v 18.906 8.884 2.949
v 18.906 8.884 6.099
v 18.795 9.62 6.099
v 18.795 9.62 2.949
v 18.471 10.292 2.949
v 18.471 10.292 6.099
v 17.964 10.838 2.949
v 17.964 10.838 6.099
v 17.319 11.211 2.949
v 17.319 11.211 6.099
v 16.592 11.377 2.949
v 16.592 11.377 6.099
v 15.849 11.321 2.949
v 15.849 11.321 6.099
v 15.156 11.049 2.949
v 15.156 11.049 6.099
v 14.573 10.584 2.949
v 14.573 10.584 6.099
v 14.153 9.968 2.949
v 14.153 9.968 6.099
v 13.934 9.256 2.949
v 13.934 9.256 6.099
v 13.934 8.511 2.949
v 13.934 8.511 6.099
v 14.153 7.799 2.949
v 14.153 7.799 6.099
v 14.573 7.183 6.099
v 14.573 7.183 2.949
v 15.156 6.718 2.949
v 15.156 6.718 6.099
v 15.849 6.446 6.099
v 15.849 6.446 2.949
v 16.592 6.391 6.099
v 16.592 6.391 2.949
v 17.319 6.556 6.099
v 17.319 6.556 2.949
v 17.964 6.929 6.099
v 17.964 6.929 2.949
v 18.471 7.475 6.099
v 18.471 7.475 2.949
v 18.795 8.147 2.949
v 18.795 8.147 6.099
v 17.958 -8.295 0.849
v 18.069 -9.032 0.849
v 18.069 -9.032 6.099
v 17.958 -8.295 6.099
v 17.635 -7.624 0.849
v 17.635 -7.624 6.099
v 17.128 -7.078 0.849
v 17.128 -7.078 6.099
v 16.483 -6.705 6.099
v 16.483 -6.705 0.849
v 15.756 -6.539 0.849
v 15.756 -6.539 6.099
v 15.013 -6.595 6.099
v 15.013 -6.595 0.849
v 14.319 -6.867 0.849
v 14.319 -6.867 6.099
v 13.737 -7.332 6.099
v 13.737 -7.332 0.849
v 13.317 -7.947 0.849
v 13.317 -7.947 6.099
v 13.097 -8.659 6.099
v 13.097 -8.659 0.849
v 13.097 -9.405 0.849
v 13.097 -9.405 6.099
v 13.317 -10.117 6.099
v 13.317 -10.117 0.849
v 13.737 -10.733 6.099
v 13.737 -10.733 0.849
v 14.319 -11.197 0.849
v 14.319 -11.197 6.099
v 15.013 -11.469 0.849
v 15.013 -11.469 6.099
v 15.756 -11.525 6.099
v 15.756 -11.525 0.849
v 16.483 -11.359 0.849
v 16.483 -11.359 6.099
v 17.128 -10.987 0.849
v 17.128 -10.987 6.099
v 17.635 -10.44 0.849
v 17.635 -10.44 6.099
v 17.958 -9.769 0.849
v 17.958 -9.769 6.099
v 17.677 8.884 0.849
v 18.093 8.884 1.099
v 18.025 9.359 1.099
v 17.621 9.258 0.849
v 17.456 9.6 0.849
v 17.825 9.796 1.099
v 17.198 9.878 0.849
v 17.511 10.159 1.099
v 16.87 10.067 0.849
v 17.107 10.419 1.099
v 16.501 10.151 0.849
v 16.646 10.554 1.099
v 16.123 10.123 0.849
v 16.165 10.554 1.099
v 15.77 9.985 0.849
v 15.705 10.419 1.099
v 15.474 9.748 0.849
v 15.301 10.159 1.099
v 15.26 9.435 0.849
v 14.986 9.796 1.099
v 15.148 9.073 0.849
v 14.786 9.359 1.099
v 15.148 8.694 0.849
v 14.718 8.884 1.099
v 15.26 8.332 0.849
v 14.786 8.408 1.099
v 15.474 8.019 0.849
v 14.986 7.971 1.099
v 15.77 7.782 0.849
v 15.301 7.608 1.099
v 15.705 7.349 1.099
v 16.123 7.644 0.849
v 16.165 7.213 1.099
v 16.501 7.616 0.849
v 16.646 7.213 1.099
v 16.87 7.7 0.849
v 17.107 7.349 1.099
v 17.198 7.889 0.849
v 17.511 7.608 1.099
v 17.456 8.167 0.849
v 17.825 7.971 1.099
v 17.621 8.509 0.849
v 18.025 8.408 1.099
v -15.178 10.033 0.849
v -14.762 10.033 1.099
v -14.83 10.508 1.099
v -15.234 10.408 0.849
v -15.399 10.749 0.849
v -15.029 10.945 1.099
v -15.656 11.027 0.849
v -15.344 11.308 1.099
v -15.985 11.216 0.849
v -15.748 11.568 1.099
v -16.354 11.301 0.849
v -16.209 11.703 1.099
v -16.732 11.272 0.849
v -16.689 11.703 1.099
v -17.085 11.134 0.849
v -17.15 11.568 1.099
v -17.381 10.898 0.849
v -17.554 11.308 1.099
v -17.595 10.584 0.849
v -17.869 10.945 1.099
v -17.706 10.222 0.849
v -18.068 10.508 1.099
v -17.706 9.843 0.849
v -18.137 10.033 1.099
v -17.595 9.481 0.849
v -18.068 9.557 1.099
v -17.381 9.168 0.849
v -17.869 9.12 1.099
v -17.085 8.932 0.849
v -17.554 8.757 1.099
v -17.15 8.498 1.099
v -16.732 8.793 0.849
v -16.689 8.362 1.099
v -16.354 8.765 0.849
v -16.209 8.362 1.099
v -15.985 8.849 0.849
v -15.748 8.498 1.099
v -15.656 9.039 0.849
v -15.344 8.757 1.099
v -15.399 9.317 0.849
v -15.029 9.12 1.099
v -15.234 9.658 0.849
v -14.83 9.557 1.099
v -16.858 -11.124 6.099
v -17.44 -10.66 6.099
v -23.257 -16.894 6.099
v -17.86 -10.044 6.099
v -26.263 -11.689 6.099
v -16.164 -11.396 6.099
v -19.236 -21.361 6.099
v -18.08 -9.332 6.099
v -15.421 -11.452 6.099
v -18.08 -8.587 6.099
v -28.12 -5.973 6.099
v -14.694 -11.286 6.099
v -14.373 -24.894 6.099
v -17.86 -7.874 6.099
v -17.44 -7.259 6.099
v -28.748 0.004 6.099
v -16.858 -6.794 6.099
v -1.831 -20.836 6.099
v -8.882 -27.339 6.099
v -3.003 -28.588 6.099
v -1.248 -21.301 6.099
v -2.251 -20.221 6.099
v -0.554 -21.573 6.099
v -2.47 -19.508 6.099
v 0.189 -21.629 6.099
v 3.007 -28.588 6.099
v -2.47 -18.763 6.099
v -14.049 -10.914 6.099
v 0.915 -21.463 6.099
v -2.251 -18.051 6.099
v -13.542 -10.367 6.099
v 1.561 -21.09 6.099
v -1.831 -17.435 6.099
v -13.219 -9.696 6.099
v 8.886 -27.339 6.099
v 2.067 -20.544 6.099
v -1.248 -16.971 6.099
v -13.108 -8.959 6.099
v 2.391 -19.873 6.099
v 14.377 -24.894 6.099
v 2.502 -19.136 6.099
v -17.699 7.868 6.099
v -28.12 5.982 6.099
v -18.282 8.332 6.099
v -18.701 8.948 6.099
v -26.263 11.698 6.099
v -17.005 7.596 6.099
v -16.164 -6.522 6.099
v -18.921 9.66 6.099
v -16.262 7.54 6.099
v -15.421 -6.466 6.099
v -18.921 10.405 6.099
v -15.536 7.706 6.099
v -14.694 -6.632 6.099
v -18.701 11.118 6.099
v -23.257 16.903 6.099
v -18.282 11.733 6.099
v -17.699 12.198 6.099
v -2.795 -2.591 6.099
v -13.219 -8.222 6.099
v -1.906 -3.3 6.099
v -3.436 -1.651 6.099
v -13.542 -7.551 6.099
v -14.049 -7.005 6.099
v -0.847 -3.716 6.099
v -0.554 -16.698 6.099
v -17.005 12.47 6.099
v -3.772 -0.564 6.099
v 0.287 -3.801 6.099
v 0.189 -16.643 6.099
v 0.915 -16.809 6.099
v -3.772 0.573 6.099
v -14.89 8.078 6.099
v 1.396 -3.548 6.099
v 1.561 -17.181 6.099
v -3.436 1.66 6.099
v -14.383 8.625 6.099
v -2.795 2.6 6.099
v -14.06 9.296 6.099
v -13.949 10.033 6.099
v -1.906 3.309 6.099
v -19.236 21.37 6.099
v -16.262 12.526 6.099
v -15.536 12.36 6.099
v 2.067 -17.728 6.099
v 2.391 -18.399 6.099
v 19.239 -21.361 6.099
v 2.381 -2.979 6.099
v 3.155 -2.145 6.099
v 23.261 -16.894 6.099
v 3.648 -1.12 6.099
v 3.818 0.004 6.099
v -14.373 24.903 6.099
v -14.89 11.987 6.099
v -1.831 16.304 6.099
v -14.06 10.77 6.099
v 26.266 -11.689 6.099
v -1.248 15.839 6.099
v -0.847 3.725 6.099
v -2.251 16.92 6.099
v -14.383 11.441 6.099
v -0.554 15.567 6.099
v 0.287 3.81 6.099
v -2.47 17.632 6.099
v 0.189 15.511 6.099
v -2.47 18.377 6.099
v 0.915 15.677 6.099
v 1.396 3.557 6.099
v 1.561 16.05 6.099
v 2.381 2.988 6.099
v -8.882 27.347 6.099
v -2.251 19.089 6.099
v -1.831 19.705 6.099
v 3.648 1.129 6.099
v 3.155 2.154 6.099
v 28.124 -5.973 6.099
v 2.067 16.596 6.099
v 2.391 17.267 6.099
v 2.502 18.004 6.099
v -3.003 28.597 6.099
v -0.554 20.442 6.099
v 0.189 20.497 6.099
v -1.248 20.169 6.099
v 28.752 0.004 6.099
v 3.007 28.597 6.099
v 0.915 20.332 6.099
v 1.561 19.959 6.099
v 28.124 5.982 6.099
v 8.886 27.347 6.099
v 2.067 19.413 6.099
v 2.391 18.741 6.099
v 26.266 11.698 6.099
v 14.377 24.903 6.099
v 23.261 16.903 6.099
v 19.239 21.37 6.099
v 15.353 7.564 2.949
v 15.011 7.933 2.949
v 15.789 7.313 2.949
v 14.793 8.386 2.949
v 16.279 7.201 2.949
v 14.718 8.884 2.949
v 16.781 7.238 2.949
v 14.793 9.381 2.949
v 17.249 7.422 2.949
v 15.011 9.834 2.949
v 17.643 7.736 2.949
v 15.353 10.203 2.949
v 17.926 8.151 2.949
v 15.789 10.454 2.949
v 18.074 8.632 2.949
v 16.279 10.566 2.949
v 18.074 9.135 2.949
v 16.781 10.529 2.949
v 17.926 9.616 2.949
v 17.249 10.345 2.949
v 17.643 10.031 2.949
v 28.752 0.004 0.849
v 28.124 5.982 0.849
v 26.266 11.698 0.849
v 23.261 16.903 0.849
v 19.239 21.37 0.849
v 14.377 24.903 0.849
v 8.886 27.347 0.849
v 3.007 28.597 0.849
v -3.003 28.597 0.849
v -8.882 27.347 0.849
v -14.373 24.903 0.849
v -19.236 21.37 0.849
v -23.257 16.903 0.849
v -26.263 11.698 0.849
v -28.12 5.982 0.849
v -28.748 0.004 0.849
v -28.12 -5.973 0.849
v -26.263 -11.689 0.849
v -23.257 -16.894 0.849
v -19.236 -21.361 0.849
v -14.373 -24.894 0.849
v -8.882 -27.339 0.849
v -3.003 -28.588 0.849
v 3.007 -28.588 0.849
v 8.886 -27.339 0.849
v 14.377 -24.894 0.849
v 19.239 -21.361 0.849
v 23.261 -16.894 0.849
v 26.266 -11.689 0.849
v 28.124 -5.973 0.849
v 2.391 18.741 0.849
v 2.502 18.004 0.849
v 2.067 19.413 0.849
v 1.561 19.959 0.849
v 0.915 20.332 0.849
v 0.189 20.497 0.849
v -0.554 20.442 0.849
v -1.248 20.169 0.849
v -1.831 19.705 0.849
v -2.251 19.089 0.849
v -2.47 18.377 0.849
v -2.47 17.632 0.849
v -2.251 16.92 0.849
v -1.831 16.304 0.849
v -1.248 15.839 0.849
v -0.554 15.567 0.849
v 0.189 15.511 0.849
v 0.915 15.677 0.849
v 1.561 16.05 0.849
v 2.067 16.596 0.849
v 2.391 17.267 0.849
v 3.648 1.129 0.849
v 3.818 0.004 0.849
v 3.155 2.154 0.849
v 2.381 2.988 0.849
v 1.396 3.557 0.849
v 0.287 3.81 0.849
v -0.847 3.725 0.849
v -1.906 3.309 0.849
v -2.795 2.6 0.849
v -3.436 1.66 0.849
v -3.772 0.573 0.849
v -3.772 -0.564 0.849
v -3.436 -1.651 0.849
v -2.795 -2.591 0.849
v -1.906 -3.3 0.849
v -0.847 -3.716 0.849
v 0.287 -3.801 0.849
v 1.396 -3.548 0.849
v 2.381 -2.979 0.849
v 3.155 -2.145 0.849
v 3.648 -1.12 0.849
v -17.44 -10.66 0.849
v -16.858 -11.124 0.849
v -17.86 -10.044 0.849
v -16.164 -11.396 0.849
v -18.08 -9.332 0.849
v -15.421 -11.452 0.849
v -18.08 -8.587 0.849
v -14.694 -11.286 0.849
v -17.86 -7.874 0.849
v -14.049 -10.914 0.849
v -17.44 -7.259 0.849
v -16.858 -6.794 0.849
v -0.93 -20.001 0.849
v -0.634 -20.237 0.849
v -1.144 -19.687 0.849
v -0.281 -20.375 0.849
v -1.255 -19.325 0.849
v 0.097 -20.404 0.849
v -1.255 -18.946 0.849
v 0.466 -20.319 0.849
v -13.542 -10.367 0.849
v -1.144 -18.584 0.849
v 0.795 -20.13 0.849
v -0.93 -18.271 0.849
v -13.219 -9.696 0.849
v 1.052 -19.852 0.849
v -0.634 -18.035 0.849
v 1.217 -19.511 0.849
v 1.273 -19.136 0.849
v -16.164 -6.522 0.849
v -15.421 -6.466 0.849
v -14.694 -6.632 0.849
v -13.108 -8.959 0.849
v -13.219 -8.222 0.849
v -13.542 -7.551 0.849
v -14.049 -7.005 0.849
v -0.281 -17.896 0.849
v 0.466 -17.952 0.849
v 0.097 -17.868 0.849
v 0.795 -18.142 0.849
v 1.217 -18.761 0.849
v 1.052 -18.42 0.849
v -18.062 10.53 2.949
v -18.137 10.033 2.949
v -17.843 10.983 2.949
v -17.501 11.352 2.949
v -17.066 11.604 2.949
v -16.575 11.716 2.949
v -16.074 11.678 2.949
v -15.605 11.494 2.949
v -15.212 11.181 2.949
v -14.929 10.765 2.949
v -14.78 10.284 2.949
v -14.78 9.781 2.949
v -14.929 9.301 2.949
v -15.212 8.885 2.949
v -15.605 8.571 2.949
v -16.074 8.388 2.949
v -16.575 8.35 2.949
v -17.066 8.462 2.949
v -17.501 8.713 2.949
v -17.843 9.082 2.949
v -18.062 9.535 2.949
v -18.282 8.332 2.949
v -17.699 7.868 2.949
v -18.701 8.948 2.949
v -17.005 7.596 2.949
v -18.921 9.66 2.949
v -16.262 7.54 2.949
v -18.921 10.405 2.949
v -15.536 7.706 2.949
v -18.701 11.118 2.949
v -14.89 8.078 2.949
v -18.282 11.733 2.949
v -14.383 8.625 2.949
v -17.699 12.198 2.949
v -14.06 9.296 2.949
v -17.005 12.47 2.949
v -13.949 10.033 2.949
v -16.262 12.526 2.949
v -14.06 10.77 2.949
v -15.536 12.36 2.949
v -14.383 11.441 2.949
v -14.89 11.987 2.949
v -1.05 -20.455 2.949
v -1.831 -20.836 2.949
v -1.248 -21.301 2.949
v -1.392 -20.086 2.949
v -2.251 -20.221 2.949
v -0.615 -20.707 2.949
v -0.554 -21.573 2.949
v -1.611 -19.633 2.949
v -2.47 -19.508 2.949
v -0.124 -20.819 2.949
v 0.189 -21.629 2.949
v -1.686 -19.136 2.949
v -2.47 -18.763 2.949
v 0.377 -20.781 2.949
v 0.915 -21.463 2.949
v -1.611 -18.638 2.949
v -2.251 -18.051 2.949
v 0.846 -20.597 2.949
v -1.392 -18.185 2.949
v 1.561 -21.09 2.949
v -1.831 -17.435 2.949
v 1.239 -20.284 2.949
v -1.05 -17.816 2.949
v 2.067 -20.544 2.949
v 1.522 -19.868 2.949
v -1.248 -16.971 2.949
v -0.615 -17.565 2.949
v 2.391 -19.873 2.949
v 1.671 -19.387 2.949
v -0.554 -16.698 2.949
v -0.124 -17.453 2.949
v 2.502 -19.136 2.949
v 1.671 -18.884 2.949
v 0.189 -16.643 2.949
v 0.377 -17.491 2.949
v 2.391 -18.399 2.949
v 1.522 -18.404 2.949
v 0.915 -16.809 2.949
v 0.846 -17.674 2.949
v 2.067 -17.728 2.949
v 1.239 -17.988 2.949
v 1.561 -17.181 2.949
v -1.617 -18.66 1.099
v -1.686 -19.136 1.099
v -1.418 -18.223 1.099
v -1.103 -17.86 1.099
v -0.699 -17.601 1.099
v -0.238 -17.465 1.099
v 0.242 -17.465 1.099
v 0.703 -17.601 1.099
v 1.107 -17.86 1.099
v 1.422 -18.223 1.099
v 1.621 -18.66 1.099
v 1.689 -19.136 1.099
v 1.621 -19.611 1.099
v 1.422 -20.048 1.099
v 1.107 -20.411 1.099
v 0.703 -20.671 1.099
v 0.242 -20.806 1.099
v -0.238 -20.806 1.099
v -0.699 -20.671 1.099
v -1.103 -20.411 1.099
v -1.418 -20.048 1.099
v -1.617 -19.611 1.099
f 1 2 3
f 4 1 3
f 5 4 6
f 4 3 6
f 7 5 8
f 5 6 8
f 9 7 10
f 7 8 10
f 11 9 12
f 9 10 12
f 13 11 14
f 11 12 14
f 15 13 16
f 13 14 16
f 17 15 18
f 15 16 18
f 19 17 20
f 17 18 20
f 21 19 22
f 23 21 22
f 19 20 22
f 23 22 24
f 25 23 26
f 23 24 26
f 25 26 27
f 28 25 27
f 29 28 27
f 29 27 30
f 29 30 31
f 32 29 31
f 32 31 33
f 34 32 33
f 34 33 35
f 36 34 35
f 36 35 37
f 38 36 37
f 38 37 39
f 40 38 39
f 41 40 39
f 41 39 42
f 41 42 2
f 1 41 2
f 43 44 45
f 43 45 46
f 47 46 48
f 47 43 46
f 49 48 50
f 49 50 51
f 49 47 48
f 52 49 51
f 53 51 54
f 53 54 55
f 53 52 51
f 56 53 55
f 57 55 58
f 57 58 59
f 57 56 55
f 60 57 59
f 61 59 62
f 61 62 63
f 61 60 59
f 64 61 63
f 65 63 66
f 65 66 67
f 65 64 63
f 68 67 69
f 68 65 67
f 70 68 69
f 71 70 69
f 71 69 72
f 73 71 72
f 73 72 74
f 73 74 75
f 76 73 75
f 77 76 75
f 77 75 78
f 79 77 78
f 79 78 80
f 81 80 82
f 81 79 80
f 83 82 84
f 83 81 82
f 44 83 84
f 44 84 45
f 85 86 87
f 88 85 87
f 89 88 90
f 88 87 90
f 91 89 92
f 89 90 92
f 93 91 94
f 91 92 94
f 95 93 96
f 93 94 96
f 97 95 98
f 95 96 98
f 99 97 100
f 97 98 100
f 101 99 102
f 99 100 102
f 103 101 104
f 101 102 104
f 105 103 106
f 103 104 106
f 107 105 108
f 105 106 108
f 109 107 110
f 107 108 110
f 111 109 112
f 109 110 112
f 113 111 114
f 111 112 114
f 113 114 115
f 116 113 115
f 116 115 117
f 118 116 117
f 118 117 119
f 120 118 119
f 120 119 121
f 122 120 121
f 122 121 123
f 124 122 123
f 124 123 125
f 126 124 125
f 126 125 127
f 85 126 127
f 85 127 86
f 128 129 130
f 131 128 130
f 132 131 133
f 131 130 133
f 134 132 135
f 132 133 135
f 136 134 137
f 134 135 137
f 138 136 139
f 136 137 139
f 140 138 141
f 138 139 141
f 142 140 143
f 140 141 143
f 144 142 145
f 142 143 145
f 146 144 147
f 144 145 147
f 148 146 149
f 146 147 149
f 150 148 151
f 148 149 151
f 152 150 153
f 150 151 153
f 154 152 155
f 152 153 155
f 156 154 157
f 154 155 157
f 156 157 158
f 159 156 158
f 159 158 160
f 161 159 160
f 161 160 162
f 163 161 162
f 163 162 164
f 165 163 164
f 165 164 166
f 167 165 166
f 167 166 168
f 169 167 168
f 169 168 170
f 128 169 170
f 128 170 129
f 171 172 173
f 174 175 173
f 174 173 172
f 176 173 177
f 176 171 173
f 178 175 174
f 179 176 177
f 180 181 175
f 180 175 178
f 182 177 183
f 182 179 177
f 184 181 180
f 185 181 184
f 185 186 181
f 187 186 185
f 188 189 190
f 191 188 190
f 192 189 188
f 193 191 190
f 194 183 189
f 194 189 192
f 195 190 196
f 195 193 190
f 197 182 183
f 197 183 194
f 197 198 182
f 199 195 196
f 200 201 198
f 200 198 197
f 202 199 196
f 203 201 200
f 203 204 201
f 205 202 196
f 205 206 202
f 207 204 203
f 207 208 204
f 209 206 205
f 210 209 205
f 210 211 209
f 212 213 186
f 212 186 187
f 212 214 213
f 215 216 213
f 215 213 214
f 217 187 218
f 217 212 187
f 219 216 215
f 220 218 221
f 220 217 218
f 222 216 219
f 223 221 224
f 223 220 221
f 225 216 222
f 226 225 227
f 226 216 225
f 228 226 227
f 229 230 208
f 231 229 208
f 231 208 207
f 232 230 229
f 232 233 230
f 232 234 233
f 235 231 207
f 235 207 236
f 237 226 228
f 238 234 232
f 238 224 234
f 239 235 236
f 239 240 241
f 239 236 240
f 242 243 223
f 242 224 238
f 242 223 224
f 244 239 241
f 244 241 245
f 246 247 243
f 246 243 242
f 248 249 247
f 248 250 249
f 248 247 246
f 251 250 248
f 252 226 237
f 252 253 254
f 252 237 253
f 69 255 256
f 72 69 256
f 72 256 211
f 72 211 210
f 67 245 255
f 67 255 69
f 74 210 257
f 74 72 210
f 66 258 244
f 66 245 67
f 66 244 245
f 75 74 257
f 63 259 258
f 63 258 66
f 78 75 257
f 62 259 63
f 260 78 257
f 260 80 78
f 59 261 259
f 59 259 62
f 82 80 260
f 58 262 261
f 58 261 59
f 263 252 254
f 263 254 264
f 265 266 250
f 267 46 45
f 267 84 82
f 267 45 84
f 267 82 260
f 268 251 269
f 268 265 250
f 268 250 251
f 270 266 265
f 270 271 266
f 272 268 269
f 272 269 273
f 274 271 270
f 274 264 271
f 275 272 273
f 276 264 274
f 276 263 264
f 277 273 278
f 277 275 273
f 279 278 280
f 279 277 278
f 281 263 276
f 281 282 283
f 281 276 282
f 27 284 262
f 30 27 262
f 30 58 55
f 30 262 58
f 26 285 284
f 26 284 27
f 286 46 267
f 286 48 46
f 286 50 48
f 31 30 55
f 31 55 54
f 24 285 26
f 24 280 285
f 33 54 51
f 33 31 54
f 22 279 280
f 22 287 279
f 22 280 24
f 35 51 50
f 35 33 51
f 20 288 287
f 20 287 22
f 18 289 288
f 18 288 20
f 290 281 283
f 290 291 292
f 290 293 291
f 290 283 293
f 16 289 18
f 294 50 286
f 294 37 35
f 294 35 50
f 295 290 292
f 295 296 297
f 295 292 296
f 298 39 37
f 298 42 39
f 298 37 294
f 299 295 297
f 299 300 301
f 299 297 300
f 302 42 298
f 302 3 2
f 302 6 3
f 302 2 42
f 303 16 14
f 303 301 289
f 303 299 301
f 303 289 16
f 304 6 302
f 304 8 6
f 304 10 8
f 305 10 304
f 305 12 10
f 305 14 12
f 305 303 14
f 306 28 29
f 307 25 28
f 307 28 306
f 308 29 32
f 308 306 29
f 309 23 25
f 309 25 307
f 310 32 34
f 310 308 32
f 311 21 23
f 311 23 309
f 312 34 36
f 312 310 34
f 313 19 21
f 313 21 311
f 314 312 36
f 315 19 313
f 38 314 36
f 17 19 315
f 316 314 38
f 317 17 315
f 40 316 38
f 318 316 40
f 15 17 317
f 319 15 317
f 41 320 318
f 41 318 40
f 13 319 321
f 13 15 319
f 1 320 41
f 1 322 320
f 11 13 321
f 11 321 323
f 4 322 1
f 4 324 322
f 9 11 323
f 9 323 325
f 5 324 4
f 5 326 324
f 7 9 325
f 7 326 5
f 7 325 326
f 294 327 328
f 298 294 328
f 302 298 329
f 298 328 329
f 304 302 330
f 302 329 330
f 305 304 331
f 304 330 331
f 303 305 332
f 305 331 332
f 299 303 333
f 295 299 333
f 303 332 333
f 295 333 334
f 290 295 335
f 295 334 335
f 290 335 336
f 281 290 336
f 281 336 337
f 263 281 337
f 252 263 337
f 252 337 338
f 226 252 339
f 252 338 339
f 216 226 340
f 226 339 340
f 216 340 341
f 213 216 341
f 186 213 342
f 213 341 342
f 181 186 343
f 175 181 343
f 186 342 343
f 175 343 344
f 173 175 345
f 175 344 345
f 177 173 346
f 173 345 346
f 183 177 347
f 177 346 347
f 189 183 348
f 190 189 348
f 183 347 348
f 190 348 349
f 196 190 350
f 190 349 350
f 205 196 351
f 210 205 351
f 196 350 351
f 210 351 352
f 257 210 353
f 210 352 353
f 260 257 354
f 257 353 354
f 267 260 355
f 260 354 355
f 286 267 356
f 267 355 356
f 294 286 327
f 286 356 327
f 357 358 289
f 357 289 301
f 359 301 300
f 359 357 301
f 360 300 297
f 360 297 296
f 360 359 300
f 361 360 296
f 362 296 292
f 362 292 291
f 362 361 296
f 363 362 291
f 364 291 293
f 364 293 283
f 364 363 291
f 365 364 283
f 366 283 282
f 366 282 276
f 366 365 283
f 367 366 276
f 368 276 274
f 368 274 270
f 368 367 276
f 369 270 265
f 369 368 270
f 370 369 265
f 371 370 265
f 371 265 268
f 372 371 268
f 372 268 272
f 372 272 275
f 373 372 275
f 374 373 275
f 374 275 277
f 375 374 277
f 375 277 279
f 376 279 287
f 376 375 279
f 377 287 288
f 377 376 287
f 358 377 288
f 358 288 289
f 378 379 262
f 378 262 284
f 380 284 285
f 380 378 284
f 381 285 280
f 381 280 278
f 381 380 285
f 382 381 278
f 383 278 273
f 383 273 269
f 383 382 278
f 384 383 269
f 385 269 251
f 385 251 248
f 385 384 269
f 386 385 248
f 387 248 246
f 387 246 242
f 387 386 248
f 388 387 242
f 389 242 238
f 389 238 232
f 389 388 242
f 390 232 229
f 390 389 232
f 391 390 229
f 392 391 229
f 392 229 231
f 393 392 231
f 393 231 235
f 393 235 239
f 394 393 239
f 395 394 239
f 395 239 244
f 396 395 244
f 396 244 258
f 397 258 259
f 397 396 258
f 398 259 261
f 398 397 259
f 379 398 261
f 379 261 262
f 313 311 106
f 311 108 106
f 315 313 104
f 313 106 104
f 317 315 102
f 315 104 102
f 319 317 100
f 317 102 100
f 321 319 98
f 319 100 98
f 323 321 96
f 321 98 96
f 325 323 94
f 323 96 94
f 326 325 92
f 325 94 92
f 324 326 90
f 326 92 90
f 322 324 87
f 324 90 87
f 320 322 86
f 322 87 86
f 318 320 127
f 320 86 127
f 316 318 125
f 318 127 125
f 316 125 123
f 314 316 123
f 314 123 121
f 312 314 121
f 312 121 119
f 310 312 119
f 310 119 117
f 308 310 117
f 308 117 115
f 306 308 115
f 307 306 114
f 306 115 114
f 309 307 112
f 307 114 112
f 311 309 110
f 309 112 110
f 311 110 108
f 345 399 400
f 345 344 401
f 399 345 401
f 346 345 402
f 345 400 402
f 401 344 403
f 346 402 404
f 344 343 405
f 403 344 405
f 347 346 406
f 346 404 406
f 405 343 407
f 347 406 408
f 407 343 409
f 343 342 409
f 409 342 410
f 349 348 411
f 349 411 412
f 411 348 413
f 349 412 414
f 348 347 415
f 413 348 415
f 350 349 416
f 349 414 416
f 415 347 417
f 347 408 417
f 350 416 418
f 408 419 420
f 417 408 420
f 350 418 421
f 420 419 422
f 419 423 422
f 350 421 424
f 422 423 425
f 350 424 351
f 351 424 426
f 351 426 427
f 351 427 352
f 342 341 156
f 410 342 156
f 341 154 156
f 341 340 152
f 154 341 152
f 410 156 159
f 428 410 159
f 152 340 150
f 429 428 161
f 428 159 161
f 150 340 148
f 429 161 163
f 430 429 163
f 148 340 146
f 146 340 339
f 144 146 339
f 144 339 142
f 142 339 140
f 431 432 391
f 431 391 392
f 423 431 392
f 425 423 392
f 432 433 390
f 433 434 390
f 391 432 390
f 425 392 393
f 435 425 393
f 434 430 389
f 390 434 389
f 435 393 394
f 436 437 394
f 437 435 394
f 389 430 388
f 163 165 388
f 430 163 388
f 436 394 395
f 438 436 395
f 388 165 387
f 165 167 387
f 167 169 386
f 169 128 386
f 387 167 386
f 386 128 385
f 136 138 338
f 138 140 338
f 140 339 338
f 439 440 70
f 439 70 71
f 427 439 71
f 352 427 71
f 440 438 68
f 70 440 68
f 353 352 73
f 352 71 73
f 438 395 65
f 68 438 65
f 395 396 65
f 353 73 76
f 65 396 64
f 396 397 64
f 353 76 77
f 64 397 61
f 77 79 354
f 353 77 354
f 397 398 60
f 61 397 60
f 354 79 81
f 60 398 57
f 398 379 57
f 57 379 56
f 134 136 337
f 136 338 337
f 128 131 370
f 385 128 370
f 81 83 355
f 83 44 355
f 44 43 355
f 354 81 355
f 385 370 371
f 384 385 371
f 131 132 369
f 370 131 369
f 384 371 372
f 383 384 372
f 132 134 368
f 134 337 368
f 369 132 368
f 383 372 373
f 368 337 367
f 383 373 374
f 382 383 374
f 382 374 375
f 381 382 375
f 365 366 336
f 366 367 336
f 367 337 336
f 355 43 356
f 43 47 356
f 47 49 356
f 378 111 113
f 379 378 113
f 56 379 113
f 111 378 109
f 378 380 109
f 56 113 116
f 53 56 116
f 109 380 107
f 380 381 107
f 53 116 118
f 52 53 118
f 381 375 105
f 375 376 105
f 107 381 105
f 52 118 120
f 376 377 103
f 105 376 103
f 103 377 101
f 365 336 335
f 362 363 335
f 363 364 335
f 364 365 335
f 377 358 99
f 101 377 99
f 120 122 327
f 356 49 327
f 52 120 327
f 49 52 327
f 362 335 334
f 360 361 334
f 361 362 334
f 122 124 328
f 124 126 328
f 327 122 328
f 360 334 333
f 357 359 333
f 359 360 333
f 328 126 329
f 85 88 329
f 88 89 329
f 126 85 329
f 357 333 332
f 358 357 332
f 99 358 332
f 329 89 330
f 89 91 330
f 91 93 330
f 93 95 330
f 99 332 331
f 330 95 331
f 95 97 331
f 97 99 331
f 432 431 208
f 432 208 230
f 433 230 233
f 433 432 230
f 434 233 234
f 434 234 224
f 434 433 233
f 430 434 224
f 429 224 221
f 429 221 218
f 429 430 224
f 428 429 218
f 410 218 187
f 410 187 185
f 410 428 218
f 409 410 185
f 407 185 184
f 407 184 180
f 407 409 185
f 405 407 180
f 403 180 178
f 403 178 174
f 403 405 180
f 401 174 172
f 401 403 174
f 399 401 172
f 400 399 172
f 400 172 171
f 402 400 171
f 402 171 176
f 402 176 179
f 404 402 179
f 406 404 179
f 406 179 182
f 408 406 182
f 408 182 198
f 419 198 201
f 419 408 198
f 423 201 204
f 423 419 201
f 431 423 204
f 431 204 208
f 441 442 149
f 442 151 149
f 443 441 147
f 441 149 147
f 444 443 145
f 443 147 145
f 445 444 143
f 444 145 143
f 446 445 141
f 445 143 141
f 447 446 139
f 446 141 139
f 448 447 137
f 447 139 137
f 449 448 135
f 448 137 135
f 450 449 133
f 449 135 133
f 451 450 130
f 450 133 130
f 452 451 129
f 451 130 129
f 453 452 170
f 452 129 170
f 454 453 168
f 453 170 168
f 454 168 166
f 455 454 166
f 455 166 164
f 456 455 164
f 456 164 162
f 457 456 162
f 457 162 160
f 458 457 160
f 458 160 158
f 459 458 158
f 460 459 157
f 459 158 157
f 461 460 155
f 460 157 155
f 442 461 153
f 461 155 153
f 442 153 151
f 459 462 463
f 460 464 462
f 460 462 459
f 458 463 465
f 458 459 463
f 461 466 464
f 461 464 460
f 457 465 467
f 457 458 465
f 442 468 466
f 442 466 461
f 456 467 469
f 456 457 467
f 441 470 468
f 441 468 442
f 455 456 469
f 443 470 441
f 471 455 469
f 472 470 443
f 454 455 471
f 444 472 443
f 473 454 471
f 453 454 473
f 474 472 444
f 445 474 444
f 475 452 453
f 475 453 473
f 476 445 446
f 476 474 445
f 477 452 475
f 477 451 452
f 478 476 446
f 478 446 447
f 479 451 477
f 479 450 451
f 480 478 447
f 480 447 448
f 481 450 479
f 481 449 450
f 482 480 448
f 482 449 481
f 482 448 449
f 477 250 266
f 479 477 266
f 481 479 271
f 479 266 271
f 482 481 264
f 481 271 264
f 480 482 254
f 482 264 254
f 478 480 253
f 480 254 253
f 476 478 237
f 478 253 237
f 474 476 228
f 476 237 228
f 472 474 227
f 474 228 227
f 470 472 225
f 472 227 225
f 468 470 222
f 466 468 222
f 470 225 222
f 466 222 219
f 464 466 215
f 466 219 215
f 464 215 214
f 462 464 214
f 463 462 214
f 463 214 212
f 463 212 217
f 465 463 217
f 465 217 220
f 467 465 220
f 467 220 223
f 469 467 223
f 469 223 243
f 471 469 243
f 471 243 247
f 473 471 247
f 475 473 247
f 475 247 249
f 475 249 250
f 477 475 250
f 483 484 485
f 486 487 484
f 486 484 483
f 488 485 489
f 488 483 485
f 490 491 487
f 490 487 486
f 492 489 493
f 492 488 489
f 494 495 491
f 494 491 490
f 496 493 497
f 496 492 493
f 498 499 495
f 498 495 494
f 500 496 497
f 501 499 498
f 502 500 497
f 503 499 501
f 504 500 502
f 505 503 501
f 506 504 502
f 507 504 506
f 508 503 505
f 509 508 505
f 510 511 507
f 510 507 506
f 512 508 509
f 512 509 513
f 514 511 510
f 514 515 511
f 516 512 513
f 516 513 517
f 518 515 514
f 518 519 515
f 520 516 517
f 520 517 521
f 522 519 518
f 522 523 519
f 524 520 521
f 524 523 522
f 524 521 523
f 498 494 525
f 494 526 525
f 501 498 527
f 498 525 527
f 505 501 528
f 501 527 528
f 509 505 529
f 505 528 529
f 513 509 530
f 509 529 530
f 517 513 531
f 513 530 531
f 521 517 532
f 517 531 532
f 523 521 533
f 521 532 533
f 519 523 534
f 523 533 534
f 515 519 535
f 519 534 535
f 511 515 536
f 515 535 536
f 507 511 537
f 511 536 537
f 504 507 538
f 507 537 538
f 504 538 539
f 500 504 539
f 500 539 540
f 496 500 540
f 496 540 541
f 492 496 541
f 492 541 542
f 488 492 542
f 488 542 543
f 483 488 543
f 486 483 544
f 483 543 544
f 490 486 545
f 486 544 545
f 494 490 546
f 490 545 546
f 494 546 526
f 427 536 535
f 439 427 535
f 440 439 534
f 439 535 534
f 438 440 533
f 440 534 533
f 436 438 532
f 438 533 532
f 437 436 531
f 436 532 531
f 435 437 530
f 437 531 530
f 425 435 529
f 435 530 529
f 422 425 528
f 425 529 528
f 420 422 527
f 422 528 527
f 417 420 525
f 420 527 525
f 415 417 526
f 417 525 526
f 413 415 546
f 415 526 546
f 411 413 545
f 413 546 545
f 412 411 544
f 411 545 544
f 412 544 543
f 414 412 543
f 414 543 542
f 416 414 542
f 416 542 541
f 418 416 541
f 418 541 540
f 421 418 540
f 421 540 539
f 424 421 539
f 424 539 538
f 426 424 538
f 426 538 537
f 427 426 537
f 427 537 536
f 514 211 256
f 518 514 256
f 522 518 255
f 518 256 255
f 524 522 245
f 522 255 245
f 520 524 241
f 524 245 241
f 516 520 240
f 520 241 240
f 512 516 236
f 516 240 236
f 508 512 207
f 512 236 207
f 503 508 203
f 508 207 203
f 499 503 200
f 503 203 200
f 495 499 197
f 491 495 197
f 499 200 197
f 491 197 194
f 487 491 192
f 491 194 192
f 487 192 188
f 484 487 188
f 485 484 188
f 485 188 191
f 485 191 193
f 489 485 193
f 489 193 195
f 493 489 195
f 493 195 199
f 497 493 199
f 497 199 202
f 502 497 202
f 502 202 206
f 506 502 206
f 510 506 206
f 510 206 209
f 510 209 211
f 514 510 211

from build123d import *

# Parameters (mm, degrees)
BOSS_EXTRU_1_DEPTH                                 = 14
BOSS_EXTRU_1_DEPTH_BACK                            = 7
ESQUISSE1_R                                        = 115
ESQUISSE1_R_2                                      = 10
ESQUISSE1_R_3                                      = 15.264337522
CHAMBRAGE_POUR_VIS_T_TE_HEXAGONALE_M12_D           = 13.5
CHAMBRAGE_POUR_VIS_T_TE_HEXAGONALE_M12_DEPTH       = 20
CHAMBRAGE_POUR_VIS_T_TE_HEXAGONALE_M12_CBORE_D     = 20
CHAMBRAGE_POUR_VIS_T_TE_HEXAGONALE_M12_CBORE_DEPTH = 12.6
CHAMBRAGE_POUR_VIS_T_TE_HEXAGONALE_M12_TIP         = 4.055809178
ECHELLE1_SCALE                                     = 0.25


with BuildPart() as part:
    # Esquisse1 → Boss.-Extru.1 (new, two sides: drawn at the far end of the back side and taken through both)
    with BuildSketch(Plane.XY.offset(-BOSS_EXTRU_1_DEPTH_BACK)):
        Circle(ESQUISSE1_R)
        with Locations((0, 72)):
            Circle(ESQUISSE1_R_2, mode=Mode.SUBTRACT)
        with Locations((-62.437871739, -35.854039838)):
            Circle(ESQUISSE1_R_2, mode=Mode.SUBTRACT)
        with Locations((62.269445197, -36.145763165)):
            Circle(ESQUISSE1_R_2, mode=Mode.SUBTRACT)
        Circle(ESQUISSE1_R_3, mode=Mode.SUBTRACT)
    extrude(amount=BOSS_EXTRU_1_DEPTH + BOSS_EXTRU_1_DEPTH_BACK)

    # Chambrage pour vis à tête hexagonale M121
    with Locations(Plane.XY.offset(14)):
        with Locations((0, -76.560659085), (65.614813045, 35.516704779), (-65.803859781, 40.113875083)):
            CounterBoreHole(CHAMBRAGE_POUR_VIS_T_TE_HEXAGONALE_M12_D / 2, CHAMBRAGE_POUR_VIS_T_TE_HEXAGONALE_M12_CBORE_D / 2, CHAMBRAGE_POUR_VIS_T_TE_HEXAGONALE_M12_CBORE_DEPTH, depth=CHAMBRAGE_POUR_VIS_T_TE_HEXAGONALE_M12_DEPTH)
            with Locations((0, 0, -(CHAMBRAGE_POUR_VIS_T_TE_HEXAGONALE_M12_DEPTH + CHAMBRAGE_POUR_VIS_T_TE_HEXAGONALE_M12_TIP / 2))):  # 118° drill point
                Cone(0, CHAMBRAGE_POUR_VIS_T_TE_HEXAGONALE_M12_D / 2, CHAMBRAGE_POUR_VIS_T_TE_HEXAGONALE_M12_TIP, mode=Mode.SUBTRACT)


with BuildPart() as part_1:
    # Echelle1: scaled about (0.002531385, 0.00580145, 3.465766244)
    add(part.part.scale(ECHELLE1_SCALE).moved(Location((0.001898539, 0.004351087, 2.599324683))))


solid = part_1.part
